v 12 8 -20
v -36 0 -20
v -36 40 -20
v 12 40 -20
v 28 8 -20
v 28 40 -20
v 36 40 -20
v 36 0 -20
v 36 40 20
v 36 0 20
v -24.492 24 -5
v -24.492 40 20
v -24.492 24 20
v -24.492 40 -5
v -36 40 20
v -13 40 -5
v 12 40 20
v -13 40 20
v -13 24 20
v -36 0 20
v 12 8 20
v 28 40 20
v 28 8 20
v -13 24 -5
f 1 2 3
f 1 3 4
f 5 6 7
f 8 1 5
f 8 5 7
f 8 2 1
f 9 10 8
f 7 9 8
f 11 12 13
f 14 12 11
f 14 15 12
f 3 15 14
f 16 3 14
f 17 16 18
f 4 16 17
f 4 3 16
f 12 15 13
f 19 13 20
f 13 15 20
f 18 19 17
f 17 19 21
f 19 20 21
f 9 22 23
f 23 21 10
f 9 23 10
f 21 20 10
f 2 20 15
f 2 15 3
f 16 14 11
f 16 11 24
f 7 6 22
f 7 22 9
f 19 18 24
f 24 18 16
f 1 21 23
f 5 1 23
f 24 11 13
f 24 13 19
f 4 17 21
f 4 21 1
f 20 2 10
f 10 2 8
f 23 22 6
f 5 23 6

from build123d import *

# Parameters (mm, degrees)
CROQUIS1_W              = 72
CROQUIS1_H              = 40
SALIENTE_EXTRUIR1_DEPTH = 40
CROQUIS5_W              = 16
CROQUIS5_H              = 40
CORTAR_EXTRUIR3_DEPTH   = 32
CROQUIS6_W              = 11.492452947
CROQUIS6_H              = 25
CORTAR_EXTRUIR5_DEPTH   = 16


with BuildPart() as part:
    # Croquis1 → Saliente-Extruir1 (new body)
    with BuildSketch(Plane(origin=(0, 0, 0), x_dir=(1, 0, 0), z_dir=(0, 1, 0))):
        Rectangle(CROQUIS1_W, CROQUIS1_H)
    extrude(amount=SALIENTE_EXTRUIR1_DEPTH)

    # Croquis5 → Cortar-Extruir3 (cut)
    with BuildSketch(Plane(origin=(0, 40, 0), x_dir=(1, 0, 0), z_dir=(0, 1, 0))):
        with Locations((20, 0)):
            Rectangle(CROQUIS5_W, CROQUIS5_H)
    extrude(amount=-CORTAR_EXTRUIR3_DEPTH, mode=Mode.SUBTRACT)

    # Croquis6 → Cortar-Extruir5 (cut)
    with BuildSketch(Plane(origin=(0, 40, 0), x_dir=(1, 0, 0), z_dir=(0, 1, 0))):
        with Locations((-18.746226474, -7.5)):
            Rectangle(CROQUIS6_W, CROQUIS6_H)
    extrude(amount=-CORTAR_EXTRUIR5_DEPTH, mode=Mode.SUBTRACT)


solid = part.part
